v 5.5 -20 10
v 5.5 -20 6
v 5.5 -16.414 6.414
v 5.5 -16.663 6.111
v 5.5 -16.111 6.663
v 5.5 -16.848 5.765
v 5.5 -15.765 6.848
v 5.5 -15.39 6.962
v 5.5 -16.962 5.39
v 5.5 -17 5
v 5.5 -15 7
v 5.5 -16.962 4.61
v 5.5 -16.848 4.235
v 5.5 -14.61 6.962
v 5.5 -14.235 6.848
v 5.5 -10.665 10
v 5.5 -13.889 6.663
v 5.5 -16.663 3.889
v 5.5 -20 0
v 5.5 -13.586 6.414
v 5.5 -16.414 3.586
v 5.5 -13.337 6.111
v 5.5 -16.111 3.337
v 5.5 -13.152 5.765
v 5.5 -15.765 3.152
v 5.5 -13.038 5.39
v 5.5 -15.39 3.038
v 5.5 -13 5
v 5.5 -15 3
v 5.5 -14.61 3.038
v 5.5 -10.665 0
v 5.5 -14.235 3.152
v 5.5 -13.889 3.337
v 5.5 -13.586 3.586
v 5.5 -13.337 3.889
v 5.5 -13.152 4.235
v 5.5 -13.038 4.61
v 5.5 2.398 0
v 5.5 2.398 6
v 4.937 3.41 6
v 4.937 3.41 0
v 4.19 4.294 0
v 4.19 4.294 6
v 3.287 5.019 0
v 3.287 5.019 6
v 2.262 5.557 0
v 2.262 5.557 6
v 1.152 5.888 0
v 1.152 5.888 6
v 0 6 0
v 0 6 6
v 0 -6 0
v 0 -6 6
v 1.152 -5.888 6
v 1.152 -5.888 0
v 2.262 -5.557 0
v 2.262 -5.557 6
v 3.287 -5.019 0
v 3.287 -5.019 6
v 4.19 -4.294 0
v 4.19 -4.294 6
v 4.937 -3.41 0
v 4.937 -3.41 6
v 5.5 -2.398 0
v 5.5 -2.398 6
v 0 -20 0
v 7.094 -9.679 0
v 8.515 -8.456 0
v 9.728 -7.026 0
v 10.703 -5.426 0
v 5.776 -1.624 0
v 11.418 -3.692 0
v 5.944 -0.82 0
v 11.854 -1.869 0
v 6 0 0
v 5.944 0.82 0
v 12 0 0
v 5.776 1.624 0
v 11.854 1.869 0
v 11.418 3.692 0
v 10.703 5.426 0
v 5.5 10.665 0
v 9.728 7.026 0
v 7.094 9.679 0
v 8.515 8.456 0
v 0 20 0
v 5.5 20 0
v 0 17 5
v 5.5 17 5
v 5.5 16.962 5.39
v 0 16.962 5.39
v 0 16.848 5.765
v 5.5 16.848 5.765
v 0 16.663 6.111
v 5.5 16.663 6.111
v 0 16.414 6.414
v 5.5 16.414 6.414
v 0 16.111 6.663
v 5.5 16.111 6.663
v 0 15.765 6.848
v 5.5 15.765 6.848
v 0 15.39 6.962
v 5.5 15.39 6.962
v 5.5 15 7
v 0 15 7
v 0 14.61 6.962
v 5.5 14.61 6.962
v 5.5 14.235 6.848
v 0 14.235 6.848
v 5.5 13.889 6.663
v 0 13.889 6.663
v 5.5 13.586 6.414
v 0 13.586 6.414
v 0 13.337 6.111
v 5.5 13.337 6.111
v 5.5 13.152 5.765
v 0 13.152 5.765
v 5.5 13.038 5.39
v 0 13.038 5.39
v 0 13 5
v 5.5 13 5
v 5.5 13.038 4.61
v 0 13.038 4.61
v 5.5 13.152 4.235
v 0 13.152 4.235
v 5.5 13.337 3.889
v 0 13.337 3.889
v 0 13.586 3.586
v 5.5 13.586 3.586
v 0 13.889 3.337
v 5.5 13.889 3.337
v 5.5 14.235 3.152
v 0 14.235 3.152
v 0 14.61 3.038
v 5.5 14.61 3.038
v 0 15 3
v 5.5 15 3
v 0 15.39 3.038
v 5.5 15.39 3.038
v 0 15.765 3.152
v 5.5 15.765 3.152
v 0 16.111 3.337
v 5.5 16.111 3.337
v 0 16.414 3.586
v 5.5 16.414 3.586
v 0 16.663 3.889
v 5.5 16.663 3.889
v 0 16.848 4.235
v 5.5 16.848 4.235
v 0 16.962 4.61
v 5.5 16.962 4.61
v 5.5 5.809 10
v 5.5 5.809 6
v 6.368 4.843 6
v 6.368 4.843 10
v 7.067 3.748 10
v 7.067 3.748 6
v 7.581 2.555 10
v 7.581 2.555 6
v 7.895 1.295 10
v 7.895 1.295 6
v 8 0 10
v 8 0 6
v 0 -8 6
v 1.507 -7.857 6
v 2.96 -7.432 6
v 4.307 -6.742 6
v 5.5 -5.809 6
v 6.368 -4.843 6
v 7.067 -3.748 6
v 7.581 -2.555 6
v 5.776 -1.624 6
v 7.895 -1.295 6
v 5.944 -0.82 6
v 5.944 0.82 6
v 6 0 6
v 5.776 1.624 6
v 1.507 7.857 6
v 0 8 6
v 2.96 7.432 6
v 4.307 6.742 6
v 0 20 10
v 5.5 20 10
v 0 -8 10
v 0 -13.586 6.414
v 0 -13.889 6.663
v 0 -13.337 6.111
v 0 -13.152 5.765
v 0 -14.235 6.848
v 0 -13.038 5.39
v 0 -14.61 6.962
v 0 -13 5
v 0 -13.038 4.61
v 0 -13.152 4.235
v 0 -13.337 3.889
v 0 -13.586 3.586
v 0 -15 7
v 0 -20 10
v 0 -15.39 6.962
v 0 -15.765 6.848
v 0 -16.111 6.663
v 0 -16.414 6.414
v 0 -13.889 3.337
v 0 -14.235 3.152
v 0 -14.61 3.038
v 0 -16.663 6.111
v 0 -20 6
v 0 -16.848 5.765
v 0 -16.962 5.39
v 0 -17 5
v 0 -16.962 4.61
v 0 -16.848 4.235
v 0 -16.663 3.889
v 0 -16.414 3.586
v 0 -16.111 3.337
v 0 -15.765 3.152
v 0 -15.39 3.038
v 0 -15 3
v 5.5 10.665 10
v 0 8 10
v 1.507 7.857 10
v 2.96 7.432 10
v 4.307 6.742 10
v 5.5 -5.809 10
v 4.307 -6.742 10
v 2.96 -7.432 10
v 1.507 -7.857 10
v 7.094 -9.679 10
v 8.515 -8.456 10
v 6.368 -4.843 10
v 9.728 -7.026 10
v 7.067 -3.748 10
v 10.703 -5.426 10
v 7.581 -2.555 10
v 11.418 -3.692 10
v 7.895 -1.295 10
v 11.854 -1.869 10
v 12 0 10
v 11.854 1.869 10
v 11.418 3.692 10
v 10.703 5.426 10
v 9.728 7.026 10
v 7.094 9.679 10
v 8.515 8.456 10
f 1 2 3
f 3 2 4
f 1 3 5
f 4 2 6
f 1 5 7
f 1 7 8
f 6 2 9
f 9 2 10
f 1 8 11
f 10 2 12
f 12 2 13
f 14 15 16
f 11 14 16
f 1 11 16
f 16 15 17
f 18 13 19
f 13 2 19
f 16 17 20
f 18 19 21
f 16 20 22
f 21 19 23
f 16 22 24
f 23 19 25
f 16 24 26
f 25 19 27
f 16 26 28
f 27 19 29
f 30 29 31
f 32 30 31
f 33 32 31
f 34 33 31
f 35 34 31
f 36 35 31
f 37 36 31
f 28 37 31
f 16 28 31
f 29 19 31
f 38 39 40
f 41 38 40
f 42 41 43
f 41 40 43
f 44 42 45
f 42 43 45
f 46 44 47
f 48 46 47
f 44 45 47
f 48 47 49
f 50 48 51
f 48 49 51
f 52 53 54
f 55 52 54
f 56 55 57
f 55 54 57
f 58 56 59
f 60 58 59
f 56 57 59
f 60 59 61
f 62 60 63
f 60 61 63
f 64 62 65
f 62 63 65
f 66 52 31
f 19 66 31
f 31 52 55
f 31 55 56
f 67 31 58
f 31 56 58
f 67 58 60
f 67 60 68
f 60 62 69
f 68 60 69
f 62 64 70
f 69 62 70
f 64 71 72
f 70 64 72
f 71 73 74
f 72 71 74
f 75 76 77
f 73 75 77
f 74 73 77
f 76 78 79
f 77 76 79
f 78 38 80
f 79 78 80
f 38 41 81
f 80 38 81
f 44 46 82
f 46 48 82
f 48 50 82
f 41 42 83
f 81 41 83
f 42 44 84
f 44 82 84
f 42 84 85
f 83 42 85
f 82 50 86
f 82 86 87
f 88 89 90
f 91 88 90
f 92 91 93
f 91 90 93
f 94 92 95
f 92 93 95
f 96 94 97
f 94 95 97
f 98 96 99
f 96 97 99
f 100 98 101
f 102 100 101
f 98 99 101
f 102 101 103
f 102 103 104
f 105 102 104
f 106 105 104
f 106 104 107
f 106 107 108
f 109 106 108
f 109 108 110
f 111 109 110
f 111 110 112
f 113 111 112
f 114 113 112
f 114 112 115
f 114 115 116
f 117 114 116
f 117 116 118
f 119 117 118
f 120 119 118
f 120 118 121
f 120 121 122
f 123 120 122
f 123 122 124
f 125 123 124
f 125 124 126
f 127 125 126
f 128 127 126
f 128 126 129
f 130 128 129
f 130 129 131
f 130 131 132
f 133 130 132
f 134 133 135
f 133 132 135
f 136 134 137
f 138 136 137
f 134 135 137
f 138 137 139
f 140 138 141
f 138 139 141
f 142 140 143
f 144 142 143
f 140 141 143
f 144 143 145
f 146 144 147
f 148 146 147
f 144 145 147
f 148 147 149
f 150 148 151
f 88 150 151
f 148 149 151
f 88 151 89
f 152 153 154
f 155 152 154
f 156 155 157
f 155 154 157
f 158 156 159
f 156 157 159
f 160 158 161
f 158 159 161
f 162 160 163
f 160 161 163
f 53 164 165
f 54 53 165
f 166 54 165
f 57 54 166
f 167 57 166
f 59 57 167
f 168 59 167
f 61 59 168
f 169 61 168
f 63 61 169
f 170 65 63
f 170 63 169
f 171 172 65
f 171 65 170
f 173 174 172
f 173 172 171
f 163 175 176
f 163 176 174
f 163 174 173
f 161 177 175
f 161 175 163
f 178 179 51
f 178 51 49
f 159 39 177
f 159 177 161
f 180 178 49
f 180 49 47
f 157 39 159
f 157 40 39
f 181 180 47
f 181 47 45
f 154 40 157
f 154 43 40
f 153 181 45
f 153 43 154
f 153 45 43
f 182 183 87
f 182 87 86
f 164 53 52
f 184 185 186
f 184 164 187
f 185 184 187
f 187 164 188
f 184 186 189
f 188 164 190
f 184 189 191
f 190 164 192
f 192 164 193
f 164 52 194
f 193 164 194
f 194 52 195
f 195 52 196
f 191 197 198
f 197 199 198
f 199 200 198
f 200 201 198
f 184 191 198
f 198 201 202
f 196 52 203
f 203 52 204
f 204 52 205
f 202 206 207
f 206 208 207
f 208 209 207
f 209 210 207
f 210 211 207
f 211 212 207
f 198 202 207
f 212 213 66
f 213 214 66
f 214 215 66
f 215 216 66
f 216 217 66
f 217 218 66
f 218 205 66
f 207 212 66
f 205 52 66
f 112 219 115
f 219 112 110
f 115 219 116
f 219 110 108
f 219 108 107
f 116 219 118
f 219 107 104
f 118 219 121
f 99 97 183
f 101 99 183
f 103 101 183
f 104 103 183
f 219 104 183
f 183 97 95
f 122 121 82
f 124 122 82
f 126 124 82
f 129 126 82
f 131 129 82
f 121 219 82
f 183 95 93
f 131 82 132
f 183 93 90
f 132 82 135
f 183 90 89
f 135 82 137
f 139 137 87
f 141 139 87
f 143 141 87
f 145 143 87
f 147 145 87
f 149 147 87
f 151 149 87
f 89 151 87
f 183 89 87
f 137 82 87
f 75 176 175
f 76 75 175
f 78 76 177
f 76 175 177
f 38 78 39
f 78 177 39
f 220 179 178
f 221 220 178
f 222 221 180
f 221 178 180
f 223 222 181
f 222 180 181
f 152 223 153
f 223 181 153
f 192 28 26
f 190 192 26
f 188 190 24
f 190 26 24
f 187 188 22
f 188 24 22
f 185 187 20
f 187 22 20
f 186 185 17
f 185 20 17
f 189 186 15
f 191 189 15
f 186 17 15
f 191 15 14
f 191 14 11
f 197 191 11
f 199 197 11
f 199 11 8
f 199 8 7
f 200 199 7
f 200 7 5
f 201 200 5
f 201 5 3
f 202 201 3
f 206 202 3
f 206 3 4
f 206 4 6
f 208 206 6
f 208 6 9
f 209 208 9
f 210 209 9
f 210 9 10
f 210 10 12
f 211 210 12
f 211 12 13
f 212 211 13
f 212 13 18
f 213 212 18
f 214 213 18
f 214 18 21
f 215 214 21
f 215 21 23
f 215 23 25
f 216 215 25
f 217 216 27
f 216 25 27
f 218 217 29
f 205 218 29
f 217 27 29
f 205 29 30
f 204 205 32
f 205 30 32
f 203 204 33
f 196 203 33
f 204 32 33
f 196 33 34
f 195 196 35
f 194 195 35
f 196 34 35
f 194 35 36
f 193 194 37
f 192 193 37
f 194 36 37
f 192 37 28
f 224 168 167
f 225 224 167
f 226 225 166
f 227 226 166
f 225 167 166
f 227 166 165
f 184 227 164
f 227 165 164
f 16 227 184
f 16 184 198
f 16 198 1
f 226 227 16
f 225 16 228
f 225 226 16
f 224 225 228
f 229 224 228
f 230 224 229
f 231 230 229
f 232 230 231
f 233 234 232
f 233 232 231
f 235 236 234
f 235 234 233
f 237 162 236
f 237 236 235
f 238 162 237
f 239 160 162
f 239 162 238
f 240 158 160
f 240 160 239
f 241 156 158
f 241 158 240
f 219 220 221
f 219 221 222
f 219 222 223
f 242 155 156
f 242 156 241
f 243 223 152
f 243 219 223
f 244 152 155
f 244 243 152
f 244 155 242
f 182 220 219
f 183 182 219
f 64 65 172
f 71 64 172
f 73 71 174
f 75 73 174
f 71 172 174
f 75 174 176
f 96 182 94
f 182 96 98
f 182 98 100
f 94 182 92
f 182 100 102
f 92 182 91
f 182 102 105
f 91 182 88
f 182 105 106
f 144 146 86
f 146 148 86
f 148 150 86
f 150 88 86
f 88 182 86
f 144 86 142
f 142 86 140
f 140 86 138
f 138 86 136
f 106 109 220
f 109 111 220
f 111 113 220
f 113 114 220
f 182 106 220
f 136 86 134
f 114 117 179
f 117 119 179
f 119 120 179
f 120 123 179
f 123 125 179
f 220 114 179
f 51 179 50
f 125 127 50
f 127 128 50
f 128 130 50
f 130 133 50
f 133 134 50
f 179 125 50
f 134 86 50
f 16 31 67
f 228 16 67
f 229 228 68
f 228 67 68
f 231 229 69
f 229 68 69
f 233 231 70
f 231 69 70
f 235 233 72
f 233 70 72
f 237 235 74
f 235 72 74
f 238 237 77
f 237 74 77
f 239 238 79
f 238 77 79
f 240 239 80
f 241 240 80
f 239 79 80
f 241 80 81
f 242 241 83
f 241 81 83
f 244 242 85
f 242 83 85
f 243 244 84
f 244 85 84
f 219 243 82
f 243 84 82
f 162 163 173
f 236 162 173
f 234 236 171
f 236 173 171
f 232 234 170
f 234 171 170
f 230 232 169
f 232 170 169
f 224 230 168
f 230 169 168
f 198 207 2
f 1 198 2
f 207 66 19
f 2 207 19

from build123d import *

# Parameters (mm, degrees)
F1_DEPTH = 10
F3_DEPTH = 4
F4_W     = 5.5
F4_H     = 11.188021542
F4_H_2   = 22.7246312633
F4_H_3   = 10.0103956625
F5_DEPTH = 25
F6_DEPTH = 4
F8_D     = 4
F8_DEPTH = 9
F8_TIP   = 1.2017212381


# Not quite as in the source:
# - a feature names something its author has since deleted; it is built from what else it names


with BuildPart() as f1:
    # F0 (on Top) → F1 (new body)
    with BuildSketch(Plane.XY):
        Polygon((60, 11.5470053838), (40, 46.1880215352), (-40, 46.1880215352), (-60, 11.5470053838), (-20, -57.735026919), (20, -57.735026919), align=None)
    extrude(amount=F1_DEPTH)

    # F2 (on face) → F3 (cut)
    with BuildSketch(Plane.XY.offset(10)):
        Polygon((-42.8867513499, 31.188021542), (-48.4529946241, 21.5470053838), (-5.5662432742, -52.7350269258), (5.5662432742, -52.7350269258), (48.4529946241, 21.5470053838), (42.8867513499, 31.188021542), align=None)
    extrude(amount=-F3_DEPTH, mode=Mode.SUBTRACT)

    # F4 (on face) + F1_face (on face) → F5 (cut)
    with BuildSketch(Plane.XY.offset(6)):
        with BuildLine():
            ThreePointArc((-5.5, -10.6653645039), (-12, 0), (-5.5, 10.6653645039))
            Line((-5.5, 10.6653645039), (-5.5, 20))
            Line((-5.5, 20), (-5.5, 31.188021542))
            Line((-5.5, 31.188021542), (-42.8867513499, 31.188021542))
            Line((-42.8867513499, 31.188021542), (-48.4529946241, 21.5470053838))
            Line((-48.4529946241, 21.5470053838), (-11.3457479046, -42.7246312633))
            Line((-11.3457479046, -42.7246312633), (-5.5, -42.7246312633))
            Line((-5.5, -42.7246312633), (-5.5, -20))
            Line((-5.5, -20), (-5.5, -10.6653645039))
        make_face()
        with Locations((2.75, 25.594010771)):
            Rectangle(F4_W, F4_H)
        with Locations((-2.75, 25.594010771)):
            Rectangle(F4_W, F4_H)
        with BuildLine():
            ThreePointArc((-5.5, 10.6653645039), (-2.8298079399, 11.6615688063), (0, 12))
            Line((0, 12), (0, 20))
            Line((0, 20), (-5.5, 20))
            Line((-5.5, 20), (-5.5, 10.6653645039))
        make_face()
        with BuildLine():
            ThreePointArc((-5.5, 5.8094750193), (-2.9600844452, 7.4322204002), (0, 8))
            Line((0, 8), (0, 12))
            ThreePointArc((0, 12), (-2.8298079399, 11.6615688063), (-5.5, 10.6653645039))
            Line((-5.5, 10.6653645039), (-5.5, 5.8094750193))
        make_face()
        with BuildLine():
            ThreePointArc((-5.5, 2.3979157617), (-3.2872865277, 5.0193373352), (0, 6))
            Line((0, 6), (0, 8))
            ThreePointArc((0, 8), (-2.9600844452, 7.4322204002), (-5.5, 5.8094750193))
            Line((-5.5, 5.8094750193), (-5.5, 2.3979157617))
        make_face()
        with BuildLine():
            Line((5.5, -2.3979157617), (5.5, 2.3979157617))
            ThreePointArc((5.5, 2.3979157617), (3.2872865277, 5.0193373352), (0, 6))
            ThreePointArc((0, 6), (-3.2872865277, 5.0193373352), (-5.5, 2.3979157617))
            Line((-5.5, 2.3979157617), (-5.5, -2.3979157617))
            ThreePointArc((-5.5, -2.3979157617), (-3.2872865277, -5.0193373352), (0, -6))
            ThreePointArc((0, -6), (3.2872865277, -5.0193373352), (5.5, -2.3979157617))
        make_face()
        with BuildLine():
            ThreePointArc((-5.5, -2.3979157617), (-6, 0), (-5.5, 2.3979157617))
            Line((-5.5, 2.3979157617), (-5.5, 5.8094750193))
            ThreePointArc((-5.5, 5.8094750193), (-8, 0), (-5.5, -5.8094750193))
            Line((-5.5, -5.8094750193), (-5.5, -2.3979157617))
        make_face()
        with BuildLine():
            ThreePointArc((-5.5, -5.8094750193), (-8, 0), (-5.5, 5.8094750193))
            Line((-5.5, 5.8094750193), (-5.5, 10.6653645039))
            ThreePointArc((-5.5, 10.6653645039), (-12, 0), (-5.5, -10.6653645039))
            Line((-5.5, -10.6653645039), (-5.5, -5.8094750193))
        make_face()
        with BuildLine():
            Line((-5.5, -2.3979157617), (-5.5, 2.3979157617))
            ThreePointArc((-5.5, 2.3979157617), (-6, 0), (-5.5, -2.3979157617))
        make_face()
        with BuildLine():
            Line((0, -8), (0, -6))
            ThreePointArc((0, -6), (-3.2872865277, -5.0193373352), (-5.5, -2.3979157617))
            Line((-5.5, -2.3979157617), (-5.5, -5.8094750193))
            ThreePointArc((-5.5, -5.8094750193), (-2.9600844452, -7.4322204002), (0, -8))
        make_face()
        with BuildLine():
            Line((0, -12), (0, -8))
            ThreePointArc((0, -8), (-2.9600844452, -7.4322204002), (-5.5, -5.8094750193))
            Line((-5.5, -5.8094750193), (-5.5, -10.6653645039))
            ThreePointArc((-5.5, -10.6653645039), (-2.8298079399, -11.6615688063), (0, -12))
        make_face()
        with BuildLine():
            Line((0, -20), (0, -12))
            ThreePointArc((0, -12), (-2.8298079399, -11.6615688063), (-5.5, -10.6653645039))
            Line((-5.5, -10.6653645039), (-5.5, -20))
            Line((-5.5, -20), (0, -20))
        make_face()
        with Locations((-2.75, -31.3623156317)):
            Rectangle(F4_W, F4_H_2)
        with Locations((2.75, -31.3623156317)):
            Rectangle(F4_W, F4_H_2)
        with BuildLine():
            Line((5.5, 20), (5.5, 10.6653645039))
            ThreePointArc((5.5, 10.6653645039), (10.246950766, 6.2449979984), (12, 0))
            ThreePointArc((12, 0), (10.246950766, -6.2449979984), (5.5, -10.6653645039))
            Line((5.5, -10.6653645039), (5.5, -20))
            Line((5.5, -20), (5.5, -42.7246312633))
            Line((5.5, -42.7246312633), (11.3457479046, -42.7246312633))
            Line((11.3457479046, -42.7246312633), (48.4529946241, 21.5470053838))
            Line((48.4529946241, 21.5470053838), (42.8867513499, 31.188021542))
            Line((42.8867513499, 31.188021542), (5.5, 31.188021542))
            Line((5.5, 31.188021542), (5.5, 20))
        make_face()
        Polygon((11.3457479046, -42.7246312633), (5.5, -42.7246312633), (5.5, -52.7350269258), (5.5662432742, -52.7350269258), align=None)
        with Locations((2.75, -47.7298290946)):
            Rectangle(F4_W, F4_H_3)
        with Locations((-2.75, -47.7298290946)):
            Rectangle(F4_W, F4_H_3)
        Polygon((-5.5, -52.7350269258), (-5.5, -42.7246312633), (-11.3457479046, -42.7246312633), (-5.5662432742, -52.7350269258), align=None)
        with BuildLine():
            ThreePointArc((5.5, -2.3979157617), (5.8736700622, -1.2247448714), (6, 0))
            ThreePointArc((6, 0), (5.8736700622, 1.2247448714), (5.5, 2.3979157617))
            Line((5.5, 2.3979157617), (5.5, -2.3979157617))
        make_face()
    with BuildSketch(Plane.XY.offset(10)):
        Polygon((60, 11.5470053838), (40, 46.1880215352), (-40, 46.1880215352), (-60, 11.5470053838), (-20, -57.735026919), (20, -57.735026919), align=None)
        Polygon((-48.4529946241, 21.5470053838), (-42.8867513499, 31.188021542), (42.8867513499, 31.188021542), (48.4529946241, 21.5470053838), (5.5662432742, -52.7350269258), (-5.5662432742, -52.7350269258), align=None, mode=Mode.SUBTRACT)
    extrude(amount=-F5_DEPTH, mode=Mode.SUBTRACT)

    # F4 (on face) → F6 (join)
    with BuildSketch(Plane.XY.offset(6)):
        with BuildLine():
            ThreePointArc((0, 12), (2.8298079399, 11.6615688063), (5.5, 10.6653645039))
            Line((5.5, 10.6653645039), (5.5, 20))
            Line((5.5, 20), (0, 20))
            Line((0, 20), (0, 12))
        make_face()
        with BuildLine():
            ThreePointArc((0, 8), (2.9600844452, 7.4322204002), (5.5, 5.8094750193))
            Line((5.5, 5.8094750193), (5.5, 10.6653645039))
            ThreePointArc((5.5, 10.6653645039), (2.8298079399, 11.6615688063), (0, 12))
            Line((0, 12), (0, 8))
        make_face()
        with BuildLine():
            Line((5.5, 10.6653645039), (5.5, 5.8094750193))
            ThreePointArc((5.5, 5.8094750193), (7.3484692283, 3.1622776602), (8, 0))
            ThreePointArc((8, 0), (7.3484692283, -3.1622776602), (5.5, -5.8094750193))
            Line((5.5, -5.8094750193), (5.5, -10.6653645039))
            ThreePointArc((5.5, -10.6653645039), (10.246950766, -6.2449979984), (12, 0))
            ThreePointArc((12, 0), (10.246950766, 6.2449979984), (5.5, 10.6653645039))
        make_face()
        with BuildLine():
            Line((5.5, -10.6653645039), (5.5, -5.8094750193))
            ThreePointArc((5.5, -5.8094750193), (2.9600844452, -7.4322204002), (0, -8))
            Line((0, -8), (0, -12))
            ThreePointArc((0, -12), (2.8298079399, -11.6615688063), (5.5, -10.6653645039))
        make_face()
        with BuildLine():
            Line((5.5, -20), (5.5, -10.6653645039))
            ThreePointArc((5.5, -10.6653645039), (2.8298079399, -11.6615688063), (0, -12))
            Line((0, -12), (0, -20))
            Line((0, -20), (5.5, -20))
        make_face()
    extrude(amount=F6_DEPTH)

    # F8
    with Locations(Plane(origin=(0, 0, 0), x_dir=(0, -1, 0), z_dir=(-1, 0, 0))):
        with Locations((15, 5), (-15, 5)):
            Hole(F8_D / 2, depth=F8_DEPTH)
            with Locations((0, 0, -(F8_DEPTH + F8_TIP / 2))):  # 118° drill point
                Cone(0, F8_D / 2, F8_TIP, mode=Mode.SUBTRACT)


solid = f1.part
